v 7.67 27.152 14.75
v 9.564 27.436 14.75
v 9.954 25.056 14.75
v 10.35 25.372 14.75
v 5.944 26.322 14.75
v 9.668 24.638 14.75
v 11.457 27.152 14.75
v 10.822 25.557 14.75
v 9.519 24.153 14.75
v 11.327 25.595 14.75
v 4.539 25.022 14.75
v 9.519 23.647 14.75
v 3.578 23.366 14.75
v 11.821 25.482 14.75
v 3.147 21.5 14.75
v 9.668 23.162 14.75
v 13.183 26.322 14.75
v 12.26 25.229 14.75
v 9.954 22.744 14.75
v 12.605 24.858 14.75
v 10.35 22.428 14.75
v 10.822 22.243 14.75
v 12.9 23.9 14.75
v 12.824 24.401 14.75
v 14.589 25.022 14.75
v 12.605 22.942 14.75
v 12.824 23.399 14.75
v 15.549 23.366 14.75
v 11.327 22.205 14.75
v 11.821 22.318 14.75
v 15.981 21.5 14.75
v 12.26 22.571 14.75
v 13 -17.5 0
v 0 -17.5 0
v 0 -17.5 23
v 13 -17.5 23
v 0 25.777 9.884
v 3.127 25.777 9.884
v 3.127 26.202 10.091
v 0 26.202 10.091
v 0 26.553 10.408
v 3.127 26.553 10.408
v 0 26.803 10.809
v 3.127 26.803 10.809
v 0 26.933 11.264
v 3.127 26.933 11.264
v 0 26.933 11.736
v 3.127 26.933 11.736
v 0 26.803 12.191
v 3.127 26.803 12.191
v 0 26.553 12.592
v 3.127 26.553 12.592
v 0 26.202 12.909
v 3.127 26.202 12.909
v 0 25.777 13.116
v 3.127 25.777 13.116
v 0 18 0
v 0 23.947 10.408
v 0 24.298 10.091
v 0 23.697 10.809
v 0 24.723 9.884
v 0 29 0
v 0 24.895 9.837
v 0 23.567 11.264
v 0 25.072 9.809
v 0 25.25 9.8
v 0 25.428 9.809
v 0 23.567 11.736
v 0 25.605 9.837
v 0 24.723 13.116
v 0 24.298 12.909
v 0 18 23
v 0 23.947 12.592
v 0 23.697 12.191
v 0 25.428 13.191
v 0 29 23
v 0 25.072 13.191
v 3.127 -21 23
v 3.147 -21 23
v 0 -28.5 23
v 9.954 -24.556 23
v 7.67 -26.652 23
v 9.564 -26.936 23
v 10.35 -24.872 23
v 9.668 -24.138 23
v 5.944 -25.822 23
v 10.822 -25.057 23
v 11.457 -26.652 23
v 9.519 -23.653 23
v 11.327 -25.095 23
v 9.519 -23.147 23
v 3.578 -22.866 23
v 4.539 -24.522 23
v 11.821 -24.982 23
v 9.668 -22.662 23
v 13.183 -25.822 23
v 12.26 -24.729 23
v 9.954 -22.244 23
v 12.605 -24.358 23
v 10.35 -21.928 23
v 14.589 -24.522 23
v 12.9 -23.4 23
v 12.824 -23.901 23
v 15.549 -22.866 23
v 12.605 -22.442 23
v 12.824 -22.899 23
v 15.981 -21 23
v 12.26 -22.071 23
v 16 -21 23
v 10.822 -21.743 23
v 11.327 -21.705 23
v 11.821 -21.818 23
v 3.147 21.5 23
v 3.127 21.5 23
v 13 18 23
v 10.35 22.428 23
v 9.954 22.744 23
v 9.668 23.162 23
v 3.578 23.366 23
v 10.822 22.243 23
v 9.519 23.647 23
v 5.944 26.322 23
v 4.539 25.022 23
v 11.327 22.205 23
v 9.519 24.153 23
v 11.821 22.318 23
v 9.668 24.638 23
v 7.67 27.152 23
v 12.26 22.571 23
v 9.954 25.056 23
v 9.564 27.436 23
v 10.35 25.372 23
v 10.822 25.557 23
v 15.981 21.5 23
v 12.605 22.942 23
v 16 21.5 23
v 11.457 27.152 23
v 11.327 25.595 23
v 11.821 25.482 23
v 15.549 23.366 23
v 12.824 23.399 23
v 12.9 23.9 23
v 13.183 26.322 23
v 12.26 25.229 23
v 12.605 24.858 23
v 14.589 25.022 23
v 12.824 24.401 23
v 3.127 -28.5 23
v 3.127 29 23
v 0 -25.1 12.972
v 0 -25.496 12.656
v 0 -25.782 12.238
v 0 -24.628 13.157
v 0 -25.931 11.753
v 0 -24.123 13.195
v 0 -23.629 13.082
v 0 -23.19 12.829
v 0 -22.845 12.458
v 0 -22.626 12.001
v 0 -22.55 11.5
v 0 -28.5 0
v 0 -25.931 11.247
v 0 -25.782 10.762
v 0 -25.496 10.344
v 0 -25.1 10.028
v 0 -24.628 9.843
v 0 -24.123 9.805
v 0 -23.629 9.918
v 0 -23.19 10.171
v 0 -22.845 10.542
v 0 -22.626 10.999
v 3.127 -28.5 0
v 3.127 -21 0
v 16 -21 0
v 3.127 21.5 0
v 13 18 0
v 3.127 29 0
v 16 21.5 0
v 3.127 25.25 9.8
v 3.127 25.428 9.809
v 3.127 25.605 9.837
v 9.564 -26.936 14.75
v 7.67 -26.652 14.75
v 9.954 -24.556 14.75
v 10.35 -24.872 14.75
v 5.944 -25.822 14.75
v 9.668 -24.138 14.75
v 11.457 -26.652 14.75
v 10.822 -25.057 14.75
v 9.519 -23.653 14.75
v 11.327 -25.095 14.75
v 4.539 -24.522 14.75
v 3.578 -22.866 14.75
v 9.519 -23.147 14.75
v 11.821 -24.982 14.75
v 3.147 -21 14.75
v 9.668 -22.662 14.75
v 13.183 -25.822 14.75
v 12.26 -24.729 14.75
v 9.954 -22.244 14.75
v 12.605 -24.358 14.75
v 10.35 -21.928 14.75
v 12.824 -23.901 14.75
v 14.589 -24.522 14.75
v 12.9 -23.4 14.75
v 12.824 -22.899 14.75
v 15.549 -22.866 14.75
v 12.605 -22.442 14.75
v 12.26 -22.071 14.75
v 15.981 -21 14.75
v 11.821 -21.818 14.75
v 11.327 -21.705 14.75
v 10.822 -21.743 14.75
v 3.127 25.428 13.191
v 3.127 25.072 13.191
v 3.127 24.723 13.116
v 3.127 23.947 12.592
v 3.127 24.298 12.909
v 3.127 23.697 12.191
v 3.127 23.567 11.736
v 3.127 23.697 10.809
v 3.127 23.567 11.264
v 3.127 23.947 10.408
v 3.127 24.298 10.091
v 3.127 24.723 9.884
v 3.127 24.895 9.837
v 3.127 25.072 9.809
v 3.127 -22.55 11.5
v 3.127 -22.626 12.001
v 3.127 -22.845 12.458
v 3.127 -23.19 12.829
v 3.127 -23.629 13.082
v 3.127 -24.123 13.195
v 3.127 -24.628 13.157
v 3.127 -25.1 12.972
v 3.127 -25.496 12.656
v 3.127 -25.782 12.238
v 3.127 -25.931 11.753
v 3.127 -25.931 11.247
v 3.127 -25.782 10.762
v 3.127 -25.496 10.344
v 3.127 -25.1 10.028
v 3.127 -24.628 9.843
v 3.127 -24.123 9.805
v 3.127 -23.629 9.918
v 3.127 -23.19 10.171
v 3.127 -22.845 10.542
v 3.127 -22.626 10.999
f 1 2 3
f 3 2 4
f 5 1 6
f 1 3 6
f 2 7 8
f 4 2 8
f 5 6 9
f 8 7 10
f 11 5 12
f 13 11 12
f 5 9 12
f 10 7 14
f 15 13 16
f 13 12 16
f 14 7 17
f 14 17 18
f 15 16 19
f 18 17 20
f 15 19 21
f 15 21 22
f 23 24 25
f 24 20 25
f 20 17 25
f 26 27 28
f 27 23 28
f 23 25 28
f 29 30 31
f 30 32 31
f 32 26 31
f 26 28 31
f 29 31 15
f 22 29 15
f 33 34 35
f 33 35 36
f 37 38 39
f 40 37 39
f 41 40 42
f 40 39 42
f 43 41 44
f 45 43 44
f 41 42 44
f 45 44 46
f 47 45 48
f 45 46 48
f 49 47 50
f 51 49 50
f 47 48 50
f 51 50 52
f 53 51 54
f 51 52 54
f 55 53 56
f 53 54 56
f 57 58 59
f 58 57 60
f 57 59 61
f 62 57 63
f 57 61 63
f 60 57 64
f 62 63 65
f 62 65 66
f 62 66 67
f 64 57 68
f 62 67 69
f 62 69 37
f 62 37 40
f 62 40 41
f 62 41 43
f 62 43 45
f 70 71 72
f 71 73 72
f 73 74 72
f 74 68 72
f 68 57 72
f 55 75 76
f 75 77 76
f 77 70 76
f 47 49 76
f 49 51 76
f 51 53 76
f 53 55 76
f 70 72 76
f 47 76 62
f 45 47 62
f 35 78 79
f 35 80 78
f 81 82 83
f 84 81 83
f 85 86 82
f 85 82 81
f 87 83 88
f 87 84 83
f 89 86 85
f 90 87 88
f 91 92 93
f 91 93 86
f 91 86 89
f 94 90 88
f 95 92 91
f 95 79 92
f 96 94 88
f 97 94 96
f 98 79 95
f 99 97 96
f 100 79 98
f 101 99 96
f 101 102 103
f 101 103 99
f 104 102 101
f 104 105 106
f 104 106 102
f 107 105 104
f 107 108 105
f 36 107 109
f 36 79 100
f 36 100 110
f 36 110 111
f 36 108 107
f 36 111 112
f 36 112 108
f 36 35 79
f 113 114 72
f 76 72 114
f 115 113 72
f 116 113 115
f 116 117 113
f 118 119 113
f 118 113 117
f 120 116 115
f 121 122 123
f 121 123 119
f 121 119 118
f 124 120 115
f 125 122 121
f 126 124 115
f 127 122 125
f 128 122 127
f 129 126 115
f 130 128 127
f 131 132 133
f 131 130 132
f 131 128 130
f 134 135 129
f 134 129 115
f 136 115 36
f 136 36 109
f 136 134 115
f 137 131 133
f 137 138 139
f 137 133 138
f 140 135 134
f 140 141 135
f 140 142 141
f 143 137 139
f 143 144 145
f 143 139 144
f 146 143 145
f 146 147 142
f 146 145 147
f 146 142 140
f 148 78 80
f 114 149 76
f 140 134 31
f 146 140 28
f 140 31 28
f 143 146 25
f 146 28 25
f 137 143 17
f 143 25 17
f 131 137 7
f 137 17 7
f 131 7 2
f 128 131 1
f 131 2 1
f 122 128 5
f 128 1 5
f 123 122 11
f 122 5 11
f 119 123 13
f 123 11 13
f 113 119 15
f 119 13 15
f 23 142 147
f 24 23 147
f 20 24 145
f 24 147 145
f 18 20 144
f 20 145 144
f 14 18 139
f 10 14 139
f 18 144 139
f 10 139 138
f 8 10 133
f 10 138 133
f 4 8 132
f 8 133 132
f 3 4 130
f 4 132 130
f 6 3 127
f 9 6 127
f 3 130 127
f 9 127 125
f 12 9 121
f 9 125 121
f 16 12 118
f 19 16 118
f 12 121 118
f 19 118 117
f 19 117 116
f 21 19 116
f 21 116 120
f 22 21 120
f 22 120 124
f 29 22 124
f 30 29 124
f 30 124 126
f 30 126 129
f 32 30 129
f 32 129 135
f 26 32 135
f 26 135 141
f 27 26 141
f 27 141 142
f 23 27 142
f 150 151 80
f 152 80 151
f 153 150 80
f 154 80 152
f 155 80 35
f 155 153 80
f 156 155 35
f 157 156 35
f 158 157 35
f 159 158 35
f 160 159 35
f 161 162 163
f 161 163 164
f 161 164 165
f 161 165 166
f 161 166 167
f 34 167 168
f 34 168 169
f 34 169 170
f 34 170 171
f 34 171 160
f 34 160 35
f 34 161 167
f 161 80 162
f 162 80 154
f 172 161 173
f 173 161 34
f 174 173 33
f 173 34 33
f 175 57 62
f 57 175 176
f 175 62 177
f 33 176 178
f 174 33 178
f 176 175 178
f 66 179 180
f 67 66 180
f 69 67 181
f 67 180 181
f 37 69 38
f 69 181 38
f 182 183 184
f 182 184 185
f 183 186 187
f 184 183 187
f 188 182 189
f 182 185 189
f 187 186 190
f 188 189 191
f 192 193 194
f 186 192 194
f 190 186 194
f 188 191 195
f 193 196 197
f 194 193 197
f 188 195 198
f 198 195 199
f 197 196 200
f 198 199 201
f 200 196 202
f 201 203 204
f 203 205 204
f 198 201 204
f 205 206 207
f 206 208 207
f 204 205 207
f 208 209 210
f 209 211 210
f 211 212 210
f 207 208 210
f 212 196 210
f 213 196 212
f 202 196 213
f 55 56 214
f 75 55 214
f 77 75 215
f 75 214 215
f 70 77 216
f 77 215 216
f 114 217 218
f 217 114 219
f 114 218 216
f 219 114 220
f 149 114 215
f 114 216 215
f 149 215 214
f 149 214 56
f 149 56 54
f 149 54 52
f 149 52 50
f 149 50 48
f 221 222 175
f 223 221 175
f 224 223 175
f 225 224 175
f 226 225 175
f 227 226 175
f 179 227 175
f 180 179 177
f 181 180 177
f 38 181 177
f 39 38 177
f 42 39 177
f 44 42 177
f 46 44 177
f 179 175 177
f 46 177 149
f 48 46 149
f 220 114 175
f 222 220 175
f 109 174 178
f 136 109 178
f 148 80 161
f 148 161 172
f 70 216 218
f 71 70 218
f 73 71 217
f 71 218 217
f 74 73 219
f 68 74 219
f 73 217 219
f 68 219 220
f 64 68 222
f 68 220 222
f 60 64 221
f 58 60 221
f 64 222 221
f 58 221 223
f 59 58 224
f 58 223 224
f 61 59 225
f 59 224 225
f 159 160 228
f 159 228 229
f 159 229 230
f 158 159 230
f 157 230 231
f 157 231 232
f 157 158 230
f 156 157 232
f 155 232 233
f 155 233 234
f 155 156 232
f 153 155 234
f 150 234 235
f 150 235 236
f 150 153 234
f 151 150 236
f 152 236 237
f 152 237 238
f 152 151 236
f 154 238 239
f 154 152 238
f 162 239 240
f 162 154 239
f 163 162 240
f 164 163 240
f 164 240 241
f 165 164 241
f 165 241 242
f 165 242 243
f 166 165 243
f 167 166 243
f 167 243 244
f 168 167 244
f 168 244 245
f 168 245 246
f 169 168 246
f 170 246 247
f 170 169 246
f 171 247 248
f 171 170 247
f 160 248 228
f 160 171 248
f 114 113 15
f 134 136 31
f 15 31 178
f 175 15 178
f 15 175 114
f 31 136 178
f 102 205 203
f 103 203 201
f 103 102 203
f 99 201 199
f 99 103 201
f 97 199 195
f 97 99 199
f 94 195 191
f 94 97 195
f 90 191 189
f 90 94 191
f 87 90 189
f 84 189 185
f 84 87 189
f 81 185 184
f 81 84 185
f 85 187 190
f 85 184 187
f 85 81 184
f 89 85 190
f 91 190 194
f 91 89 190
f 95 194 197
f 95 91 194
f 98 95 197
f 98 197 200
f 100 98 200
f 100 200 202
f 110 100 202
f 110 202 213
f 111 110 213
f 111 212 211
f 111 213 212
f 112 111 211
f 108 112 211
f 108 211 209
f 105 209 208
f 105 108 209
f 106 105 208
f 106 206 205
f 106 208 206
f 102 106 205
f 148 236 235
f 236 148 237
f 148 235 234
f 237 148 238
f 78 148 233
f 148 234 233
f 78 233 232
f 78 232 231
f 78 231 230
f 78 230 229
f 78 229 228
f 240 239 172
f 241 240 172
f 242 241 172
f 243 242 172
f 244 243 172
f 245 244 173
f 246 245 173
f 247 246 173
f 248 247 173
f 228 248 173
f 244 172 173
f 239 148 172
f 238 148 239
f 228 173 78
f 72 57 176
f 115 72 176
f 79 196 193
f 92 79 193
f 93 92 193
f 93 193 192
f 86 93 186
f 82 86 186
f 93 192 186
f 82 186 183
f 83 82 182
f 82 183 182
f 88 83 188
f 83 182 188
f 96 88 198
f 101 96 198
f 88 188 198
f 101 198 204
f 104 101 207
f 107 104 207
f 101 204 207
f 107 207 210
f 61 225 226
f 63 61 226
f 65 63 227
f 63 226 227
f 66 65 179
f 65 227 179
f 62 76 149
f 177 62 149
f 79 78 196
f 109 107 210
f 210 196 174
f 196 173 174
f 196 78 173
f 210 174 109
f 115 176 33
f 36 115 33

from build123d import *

# Parameters (mm, degrees)
BOSS_EXTRUDE1_DEPTH = 23
SKETCH2_R           = 1.7
CUT_EXTRUDE1_DEPTH  = 39.81958977
CUT_EXTRUDE5_START  = 23
SKETCH2_8_W         = 14.75
SKETCH2_8_H         = 7
SKETCH2_8_R         = 1.7
CUT_EXTRUDE5_DEPTH  = 23
SKETCH5_R           = 1.7
CUT_EXTRUDE6_DEPTH  = 41.323690307
SKETCH6_R           = 1.7
CUT_EXTRUDE7_DEPTH  = 23


with BuildPart() as part:
    # Sketch1 → Boss-Extrude1 (new body)
    with BuildSketch(Plane.XY):
        with BuildLine():
            Line((13, 18), (13, -18))
            Line((13, -18), (0, -18))
            Line((0, -18), (0, -28.5))
            Line((0, -28.5), (3.127139018, -28.5))
            Line((3.127139018, -28.5), (3.127139018, -21))
            Line((3.127139018, -21), (16, -21))
            Line((16, -21), (16, 21))
            ThreePointArc((16, 21), (9.563569509, 27.436430491), (3.127139018, 21))
            Line((3.127139018, 21), (3.127139018, 28.5))
            Line((3.127139018, 28.5), (0, 28.5))
            Line((0, 28.5), (0, 18))
            Line((0, 18), (13, 18))
        make_face()
    boss_extrude1 = extrude(amount=BOSS_EXTRUDE1_DEPTH)

    # Sketch2 → Cut-Extrude1 (cut, symmetric)
    with BuildSketch(Plane(origin=(3.127139018, 0, 0), x_dir=(0, 0, -1), z_dir=(1, 0, 0))):
        with Locations((-11.5, 24.75)):
            Circle(SKETCH2_R)
    cut_extrude1 = extrude(amount=CUT_EXTRUDE1_DEPTH, both=True, mode=Mode.SUBTRACT)

    # Sketch2<8> → Cut-Extrude5 (cut)
    with BuildSketch(Plane(origin=(3.127139018, 0, 0), x_dir=(0, 0, -1), z_dir=(1, 0, 0)).offset(CUT_EXTRUDE5_START)):
        with Locations((-7.375, 25)):
            Rectangle(SKETCH2_8_W, SKETCH2_8_H)
        with Locations((-11.5, 24.75)):
            Circle(SKETCH2_8_R, mode=Mode.SUBTRACT)
    cut_extrude5 = extrude(amount=-CUT_EXTRUDE5_DEPTH, mode=Mode.SUBTRACT)

    # Mirror5: Boss-Extrude1, Cut-Extrude1, Cut-Extrude5 across plane
    add(boss_extrude1.mirror(Plane(origin=(0, 0.25, 0), x_dir=(0, 0, 1), z_dir=(0, -1, 0))))
    add(cut_extrude1.mirror(Plane(origin=(0, 0.25, 0), x_dir=(0, 0, 1), z_dir=(0, -1, 0))), mode=Mode.SUBTRACT)
    add(cut_extrude5.mirror(Plane(origin=(0, 0.25, 0), x_dir=(0, 0, 1), z_dir=(0, -1, 0))), mode=Mode.SUBTRACT)

    # Sketch5 → Cut-Extrude6 (cut, through all)
    with BuildSketch(Plane.XY.offset(23)):
        with Locations((11.2, 23.9)):
            Circle(SKETCH5_R)
    cut_extrude6 = extrude(amount=-CUT_EXTRUDE6_DEPTH, mode=Mode.SUBTRACT)

    # Mirror8: Cut-Extrude6 across plane
    add(cut_extrude6.mirror(Plane(origin=(0, 0.25, 0), x_dir=(0, 0, 1), z_dir=(0, -1, 0))), mode=Mode.SUBTRACT)

    # Sketch6 → Cut-Extrude7 (cut)
    with BuildSketch(Plane(origin=(3.127139018, 0, 0), x_dir=(0, 0, -1), z_dir=(1, 0, 0))):
        with Locations((-11.5, 25.25)):
            Circle(SKETCH6_R)
    extrude(amount=-CUT_EXTRUDE7_DEPTH, mode=Mode.SUBTRACT)


solid = part.part
